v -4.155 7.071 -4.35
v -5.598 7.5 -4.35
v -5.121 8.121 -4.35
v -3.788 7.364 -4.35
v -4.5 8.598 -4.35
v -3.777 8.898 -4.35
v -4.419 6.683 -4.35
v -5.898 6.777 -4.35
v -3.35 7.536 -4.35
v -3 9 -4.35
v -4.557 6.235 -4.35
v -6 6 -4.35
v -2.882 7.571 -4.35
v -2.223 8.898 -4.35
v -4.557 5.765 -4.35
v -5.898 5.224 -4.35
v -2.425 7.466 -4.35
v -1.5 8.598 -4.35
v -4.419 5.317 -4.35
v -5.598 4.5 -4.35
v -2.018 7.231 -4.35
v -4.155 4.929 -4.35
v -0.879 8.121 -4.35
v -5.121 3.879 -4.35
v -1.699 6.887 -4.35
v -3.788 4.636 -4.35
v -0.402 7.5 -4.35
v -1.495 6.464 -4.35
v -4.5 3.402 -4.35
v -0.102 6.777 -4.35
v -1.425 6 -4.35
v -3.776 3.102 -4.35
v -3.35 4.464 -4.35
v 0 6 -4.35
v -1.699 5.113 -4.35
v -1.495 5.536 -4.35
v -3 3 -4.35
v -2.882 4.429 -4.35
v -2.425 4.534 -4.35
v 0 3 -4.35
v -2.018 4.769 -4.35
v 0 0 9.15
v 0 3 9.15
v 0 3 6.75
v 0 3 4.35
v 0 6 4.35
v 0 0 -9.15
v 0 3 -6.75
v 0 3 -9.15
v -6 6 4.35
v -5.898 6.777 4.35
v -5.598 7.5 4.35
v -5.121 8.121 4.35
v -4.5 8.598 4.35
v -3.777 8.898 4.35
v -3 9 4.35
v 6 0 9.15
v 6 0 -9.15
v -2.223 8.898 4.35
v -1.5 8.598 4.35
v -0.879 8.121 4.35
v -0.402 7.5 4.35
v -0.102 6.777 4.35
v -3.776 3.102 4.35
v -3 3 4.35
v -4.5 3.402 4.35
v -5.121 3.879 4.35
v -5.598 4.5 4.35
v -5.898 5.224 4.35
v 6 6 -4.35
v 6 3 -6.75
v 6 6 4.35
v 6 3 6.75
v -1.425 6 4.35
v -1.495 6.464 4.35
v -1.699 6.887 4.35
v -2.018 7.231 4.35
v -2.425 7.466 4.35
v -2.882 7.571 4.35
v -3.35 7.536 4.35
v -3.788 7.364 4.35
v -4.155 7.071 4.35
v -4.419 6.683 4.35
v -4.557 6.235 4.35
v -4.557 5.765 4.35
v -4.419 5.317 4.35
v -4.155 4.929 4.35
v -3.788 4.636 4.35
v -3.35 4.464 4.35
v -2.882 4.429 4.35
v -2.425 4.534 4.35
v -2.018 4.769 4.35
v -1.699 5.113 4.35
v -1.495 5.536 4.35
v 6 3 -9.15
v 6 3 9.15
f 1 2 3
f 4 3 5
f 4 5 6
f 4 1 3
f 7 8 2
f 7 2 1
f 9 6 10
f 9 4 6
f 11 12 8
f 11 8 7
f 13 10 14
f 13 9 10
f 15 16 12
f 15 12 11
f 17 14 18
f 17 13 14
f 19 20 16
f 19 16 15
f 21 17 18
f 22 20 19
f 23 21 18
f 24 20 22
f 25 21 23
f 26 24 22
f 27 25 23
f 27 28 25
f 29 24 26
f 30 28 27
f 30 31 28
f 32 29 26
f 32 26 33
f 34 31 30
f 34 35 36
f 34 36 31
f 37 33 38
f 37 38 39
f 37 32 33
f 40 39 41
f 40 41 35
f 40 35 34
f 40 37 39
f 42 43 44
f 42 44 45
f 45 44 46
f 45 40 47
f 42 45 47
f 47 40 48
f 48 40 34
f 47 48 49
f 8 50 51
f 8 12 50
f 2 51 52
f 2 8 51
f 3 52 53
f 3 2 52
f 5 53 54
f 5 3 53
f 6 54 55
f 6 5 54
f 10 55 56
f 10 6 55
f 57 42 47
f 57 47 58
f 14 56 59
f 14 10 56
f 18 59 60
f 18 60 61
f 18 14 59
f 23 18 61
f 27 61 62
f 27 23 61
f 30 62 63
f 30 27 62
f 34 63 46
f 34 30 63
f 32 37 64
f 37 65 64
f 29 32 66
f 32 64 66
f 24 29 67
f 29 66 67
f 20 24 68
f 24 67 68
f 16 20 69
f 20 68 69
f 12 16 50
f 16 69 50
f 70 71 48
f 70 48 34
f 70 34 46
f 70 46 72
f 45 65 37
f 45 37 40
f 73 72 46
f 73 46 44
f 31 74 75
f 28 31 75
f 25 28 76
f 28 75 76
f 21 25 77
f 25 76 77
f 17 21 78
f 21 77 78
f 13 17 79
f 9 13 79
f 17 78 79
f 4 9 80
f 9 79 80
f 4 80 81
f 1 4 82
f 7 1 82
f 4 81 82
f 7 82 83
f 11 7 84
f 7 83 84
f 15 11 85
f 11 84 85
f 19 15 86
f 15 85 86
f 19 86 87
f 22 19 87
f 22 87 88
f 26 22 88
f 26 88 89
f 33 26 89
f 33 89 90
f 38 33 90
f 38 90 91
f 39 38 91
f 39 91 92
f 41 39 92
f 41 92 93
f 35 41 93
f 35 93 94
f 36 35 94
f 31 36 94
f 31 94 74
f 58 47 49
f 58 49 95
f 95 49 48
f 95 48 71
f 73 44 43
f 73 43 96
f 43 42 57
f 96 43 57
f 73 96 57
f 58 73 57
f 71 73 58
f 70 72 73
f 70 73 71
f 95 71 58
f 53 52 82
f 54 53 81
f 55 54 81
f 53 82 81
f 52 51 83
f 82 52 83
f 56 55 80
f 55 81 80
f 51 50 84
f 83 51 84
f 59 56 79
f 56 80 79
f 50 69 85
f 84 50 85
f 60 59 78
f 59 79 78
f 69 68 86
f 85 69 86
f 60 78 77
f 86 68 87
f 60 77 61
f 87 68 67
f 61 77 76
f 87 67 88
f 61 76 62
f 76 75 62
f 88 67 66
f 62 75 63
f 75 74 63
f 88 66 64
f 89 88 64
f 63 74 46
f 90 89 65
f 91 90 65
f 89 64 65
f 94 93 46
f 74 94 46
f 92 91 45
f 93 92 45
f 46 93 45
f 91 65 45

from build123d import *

# Parameters (mm, degrees)
SKETCH1_W           = 12
SKETCH1_H           = 18.3
BOSS_EXTRUDE1_DEPTH = 3
SKETCH2_W           = 6
SKETCH2_H           = 8.7
BOSS_EXTRUDE2_DEPTH = 6
SKETCH3_R           = 1.575
CUT_EXTRUDE1_DEPTH  = 22.257704486
FILLET1_R           = 3
SKETCH4_W           = 6
SKETCH4_H           = 8.7
BOSS_EXTRUDE3_DEPTH = 3
SKETCH5_W           = 6
SKETCH5_H           = 18.3
CUT_EXTRUDE2_DEPTH  = 3
FILLET2_R           = 3
BOSS_EXTRUDE4_DEPTH = 6


with BuildPart() as part:
    # Sketch1 → Boss-Extrude1 (new body)
    with BuildSketch(Plane(origin=(0, 0, 0), x_dir=(1, 0, 0), z_dir=(0, 1, 0))):
        Rectangle(SKETCH1_W, SKETCH1_H)
    extrude(amount=BOSS_EXTRUDE1_DEPTH)

    # Sketch2 → Boss-Extrude2 (add)
    with BuildSketch(Plane(origin=(0, 3, 0), x_dir=(1, 0, 0), z_dir=(0, 1, 0))):
        with Locations((-3, 0)):
            Rectangle(SKETCH2_W, SKETCH2_H)
    extrude(amount=BOSS_EXTRUDE2_DEPTH)

    # Sketch3 → Cut-Extrude1 (cut, through all)
    with BuildSketch(Plane.XY.offset(9.15)):
        with Locations((-3, 6)):
            Circle(SKETCH3_R)
    extrude(amount=-CUT_EXTRUDE1_DEPTH, mode=Mode.SUBTRACT)

    # Fillet1
    fillet1_edges = [part.edges().sort_by_distance(p)[0] for p in [
        (-6, 9, 0),
        (0, 9, 0),
    ]]
    fillet(fillet1_edges, radius=FILLET1_R - 0.0001)  # a hair under: the kernel refuses the full size

    # Sketch4 → Boss-Extrude3 (add)
    with BuildSketch(Plane(origin=(0, 3, 0), x_dir=(1, 0, 0), z_dir=(0, 1, 0))):
        with Locations((3, 0)):
            Rectangle(SKETCH4_W, SKETCH4_H)
    extrude(amount=BOSS_EXTRUDE3_DEPTH)

    # Sketch5 → Cut-Extrude2 (cut)
    with BuildSketch(Plane.XZ):
        with Locations((-3, 0)):
            Rectangle(SKETCH5_W, SKETCH5_H)
    extrude(amount=-CUT_EXTRUDE2_DEPTH, mode=Mode.SUBTRACT)

    # Fillet2
    fillet2_edges = [part.edges().sort_by_distance(p)[0] for p in [
        (-6, 3, 0),
    ]]
    fillet(fillet2_edges, radius=FILLET2_R)

    # Sketch6 → Boss-Extrude4 (add)
    with BuildSketch(Plane(origin=(6, 0, 0), x_dir=(0, 0, -1), z_dir=(1, 0, 0))):
        Polygon((4.35, 3), (6.75, 3), (4.35, 6), align=None)
        Polygon((-4.35, 3), (-4.35, 6), (-6.75, 3), align=None)
    extrude(amount=-BOSS_EXTRUDE4_DEPTH)


solid = part.part
